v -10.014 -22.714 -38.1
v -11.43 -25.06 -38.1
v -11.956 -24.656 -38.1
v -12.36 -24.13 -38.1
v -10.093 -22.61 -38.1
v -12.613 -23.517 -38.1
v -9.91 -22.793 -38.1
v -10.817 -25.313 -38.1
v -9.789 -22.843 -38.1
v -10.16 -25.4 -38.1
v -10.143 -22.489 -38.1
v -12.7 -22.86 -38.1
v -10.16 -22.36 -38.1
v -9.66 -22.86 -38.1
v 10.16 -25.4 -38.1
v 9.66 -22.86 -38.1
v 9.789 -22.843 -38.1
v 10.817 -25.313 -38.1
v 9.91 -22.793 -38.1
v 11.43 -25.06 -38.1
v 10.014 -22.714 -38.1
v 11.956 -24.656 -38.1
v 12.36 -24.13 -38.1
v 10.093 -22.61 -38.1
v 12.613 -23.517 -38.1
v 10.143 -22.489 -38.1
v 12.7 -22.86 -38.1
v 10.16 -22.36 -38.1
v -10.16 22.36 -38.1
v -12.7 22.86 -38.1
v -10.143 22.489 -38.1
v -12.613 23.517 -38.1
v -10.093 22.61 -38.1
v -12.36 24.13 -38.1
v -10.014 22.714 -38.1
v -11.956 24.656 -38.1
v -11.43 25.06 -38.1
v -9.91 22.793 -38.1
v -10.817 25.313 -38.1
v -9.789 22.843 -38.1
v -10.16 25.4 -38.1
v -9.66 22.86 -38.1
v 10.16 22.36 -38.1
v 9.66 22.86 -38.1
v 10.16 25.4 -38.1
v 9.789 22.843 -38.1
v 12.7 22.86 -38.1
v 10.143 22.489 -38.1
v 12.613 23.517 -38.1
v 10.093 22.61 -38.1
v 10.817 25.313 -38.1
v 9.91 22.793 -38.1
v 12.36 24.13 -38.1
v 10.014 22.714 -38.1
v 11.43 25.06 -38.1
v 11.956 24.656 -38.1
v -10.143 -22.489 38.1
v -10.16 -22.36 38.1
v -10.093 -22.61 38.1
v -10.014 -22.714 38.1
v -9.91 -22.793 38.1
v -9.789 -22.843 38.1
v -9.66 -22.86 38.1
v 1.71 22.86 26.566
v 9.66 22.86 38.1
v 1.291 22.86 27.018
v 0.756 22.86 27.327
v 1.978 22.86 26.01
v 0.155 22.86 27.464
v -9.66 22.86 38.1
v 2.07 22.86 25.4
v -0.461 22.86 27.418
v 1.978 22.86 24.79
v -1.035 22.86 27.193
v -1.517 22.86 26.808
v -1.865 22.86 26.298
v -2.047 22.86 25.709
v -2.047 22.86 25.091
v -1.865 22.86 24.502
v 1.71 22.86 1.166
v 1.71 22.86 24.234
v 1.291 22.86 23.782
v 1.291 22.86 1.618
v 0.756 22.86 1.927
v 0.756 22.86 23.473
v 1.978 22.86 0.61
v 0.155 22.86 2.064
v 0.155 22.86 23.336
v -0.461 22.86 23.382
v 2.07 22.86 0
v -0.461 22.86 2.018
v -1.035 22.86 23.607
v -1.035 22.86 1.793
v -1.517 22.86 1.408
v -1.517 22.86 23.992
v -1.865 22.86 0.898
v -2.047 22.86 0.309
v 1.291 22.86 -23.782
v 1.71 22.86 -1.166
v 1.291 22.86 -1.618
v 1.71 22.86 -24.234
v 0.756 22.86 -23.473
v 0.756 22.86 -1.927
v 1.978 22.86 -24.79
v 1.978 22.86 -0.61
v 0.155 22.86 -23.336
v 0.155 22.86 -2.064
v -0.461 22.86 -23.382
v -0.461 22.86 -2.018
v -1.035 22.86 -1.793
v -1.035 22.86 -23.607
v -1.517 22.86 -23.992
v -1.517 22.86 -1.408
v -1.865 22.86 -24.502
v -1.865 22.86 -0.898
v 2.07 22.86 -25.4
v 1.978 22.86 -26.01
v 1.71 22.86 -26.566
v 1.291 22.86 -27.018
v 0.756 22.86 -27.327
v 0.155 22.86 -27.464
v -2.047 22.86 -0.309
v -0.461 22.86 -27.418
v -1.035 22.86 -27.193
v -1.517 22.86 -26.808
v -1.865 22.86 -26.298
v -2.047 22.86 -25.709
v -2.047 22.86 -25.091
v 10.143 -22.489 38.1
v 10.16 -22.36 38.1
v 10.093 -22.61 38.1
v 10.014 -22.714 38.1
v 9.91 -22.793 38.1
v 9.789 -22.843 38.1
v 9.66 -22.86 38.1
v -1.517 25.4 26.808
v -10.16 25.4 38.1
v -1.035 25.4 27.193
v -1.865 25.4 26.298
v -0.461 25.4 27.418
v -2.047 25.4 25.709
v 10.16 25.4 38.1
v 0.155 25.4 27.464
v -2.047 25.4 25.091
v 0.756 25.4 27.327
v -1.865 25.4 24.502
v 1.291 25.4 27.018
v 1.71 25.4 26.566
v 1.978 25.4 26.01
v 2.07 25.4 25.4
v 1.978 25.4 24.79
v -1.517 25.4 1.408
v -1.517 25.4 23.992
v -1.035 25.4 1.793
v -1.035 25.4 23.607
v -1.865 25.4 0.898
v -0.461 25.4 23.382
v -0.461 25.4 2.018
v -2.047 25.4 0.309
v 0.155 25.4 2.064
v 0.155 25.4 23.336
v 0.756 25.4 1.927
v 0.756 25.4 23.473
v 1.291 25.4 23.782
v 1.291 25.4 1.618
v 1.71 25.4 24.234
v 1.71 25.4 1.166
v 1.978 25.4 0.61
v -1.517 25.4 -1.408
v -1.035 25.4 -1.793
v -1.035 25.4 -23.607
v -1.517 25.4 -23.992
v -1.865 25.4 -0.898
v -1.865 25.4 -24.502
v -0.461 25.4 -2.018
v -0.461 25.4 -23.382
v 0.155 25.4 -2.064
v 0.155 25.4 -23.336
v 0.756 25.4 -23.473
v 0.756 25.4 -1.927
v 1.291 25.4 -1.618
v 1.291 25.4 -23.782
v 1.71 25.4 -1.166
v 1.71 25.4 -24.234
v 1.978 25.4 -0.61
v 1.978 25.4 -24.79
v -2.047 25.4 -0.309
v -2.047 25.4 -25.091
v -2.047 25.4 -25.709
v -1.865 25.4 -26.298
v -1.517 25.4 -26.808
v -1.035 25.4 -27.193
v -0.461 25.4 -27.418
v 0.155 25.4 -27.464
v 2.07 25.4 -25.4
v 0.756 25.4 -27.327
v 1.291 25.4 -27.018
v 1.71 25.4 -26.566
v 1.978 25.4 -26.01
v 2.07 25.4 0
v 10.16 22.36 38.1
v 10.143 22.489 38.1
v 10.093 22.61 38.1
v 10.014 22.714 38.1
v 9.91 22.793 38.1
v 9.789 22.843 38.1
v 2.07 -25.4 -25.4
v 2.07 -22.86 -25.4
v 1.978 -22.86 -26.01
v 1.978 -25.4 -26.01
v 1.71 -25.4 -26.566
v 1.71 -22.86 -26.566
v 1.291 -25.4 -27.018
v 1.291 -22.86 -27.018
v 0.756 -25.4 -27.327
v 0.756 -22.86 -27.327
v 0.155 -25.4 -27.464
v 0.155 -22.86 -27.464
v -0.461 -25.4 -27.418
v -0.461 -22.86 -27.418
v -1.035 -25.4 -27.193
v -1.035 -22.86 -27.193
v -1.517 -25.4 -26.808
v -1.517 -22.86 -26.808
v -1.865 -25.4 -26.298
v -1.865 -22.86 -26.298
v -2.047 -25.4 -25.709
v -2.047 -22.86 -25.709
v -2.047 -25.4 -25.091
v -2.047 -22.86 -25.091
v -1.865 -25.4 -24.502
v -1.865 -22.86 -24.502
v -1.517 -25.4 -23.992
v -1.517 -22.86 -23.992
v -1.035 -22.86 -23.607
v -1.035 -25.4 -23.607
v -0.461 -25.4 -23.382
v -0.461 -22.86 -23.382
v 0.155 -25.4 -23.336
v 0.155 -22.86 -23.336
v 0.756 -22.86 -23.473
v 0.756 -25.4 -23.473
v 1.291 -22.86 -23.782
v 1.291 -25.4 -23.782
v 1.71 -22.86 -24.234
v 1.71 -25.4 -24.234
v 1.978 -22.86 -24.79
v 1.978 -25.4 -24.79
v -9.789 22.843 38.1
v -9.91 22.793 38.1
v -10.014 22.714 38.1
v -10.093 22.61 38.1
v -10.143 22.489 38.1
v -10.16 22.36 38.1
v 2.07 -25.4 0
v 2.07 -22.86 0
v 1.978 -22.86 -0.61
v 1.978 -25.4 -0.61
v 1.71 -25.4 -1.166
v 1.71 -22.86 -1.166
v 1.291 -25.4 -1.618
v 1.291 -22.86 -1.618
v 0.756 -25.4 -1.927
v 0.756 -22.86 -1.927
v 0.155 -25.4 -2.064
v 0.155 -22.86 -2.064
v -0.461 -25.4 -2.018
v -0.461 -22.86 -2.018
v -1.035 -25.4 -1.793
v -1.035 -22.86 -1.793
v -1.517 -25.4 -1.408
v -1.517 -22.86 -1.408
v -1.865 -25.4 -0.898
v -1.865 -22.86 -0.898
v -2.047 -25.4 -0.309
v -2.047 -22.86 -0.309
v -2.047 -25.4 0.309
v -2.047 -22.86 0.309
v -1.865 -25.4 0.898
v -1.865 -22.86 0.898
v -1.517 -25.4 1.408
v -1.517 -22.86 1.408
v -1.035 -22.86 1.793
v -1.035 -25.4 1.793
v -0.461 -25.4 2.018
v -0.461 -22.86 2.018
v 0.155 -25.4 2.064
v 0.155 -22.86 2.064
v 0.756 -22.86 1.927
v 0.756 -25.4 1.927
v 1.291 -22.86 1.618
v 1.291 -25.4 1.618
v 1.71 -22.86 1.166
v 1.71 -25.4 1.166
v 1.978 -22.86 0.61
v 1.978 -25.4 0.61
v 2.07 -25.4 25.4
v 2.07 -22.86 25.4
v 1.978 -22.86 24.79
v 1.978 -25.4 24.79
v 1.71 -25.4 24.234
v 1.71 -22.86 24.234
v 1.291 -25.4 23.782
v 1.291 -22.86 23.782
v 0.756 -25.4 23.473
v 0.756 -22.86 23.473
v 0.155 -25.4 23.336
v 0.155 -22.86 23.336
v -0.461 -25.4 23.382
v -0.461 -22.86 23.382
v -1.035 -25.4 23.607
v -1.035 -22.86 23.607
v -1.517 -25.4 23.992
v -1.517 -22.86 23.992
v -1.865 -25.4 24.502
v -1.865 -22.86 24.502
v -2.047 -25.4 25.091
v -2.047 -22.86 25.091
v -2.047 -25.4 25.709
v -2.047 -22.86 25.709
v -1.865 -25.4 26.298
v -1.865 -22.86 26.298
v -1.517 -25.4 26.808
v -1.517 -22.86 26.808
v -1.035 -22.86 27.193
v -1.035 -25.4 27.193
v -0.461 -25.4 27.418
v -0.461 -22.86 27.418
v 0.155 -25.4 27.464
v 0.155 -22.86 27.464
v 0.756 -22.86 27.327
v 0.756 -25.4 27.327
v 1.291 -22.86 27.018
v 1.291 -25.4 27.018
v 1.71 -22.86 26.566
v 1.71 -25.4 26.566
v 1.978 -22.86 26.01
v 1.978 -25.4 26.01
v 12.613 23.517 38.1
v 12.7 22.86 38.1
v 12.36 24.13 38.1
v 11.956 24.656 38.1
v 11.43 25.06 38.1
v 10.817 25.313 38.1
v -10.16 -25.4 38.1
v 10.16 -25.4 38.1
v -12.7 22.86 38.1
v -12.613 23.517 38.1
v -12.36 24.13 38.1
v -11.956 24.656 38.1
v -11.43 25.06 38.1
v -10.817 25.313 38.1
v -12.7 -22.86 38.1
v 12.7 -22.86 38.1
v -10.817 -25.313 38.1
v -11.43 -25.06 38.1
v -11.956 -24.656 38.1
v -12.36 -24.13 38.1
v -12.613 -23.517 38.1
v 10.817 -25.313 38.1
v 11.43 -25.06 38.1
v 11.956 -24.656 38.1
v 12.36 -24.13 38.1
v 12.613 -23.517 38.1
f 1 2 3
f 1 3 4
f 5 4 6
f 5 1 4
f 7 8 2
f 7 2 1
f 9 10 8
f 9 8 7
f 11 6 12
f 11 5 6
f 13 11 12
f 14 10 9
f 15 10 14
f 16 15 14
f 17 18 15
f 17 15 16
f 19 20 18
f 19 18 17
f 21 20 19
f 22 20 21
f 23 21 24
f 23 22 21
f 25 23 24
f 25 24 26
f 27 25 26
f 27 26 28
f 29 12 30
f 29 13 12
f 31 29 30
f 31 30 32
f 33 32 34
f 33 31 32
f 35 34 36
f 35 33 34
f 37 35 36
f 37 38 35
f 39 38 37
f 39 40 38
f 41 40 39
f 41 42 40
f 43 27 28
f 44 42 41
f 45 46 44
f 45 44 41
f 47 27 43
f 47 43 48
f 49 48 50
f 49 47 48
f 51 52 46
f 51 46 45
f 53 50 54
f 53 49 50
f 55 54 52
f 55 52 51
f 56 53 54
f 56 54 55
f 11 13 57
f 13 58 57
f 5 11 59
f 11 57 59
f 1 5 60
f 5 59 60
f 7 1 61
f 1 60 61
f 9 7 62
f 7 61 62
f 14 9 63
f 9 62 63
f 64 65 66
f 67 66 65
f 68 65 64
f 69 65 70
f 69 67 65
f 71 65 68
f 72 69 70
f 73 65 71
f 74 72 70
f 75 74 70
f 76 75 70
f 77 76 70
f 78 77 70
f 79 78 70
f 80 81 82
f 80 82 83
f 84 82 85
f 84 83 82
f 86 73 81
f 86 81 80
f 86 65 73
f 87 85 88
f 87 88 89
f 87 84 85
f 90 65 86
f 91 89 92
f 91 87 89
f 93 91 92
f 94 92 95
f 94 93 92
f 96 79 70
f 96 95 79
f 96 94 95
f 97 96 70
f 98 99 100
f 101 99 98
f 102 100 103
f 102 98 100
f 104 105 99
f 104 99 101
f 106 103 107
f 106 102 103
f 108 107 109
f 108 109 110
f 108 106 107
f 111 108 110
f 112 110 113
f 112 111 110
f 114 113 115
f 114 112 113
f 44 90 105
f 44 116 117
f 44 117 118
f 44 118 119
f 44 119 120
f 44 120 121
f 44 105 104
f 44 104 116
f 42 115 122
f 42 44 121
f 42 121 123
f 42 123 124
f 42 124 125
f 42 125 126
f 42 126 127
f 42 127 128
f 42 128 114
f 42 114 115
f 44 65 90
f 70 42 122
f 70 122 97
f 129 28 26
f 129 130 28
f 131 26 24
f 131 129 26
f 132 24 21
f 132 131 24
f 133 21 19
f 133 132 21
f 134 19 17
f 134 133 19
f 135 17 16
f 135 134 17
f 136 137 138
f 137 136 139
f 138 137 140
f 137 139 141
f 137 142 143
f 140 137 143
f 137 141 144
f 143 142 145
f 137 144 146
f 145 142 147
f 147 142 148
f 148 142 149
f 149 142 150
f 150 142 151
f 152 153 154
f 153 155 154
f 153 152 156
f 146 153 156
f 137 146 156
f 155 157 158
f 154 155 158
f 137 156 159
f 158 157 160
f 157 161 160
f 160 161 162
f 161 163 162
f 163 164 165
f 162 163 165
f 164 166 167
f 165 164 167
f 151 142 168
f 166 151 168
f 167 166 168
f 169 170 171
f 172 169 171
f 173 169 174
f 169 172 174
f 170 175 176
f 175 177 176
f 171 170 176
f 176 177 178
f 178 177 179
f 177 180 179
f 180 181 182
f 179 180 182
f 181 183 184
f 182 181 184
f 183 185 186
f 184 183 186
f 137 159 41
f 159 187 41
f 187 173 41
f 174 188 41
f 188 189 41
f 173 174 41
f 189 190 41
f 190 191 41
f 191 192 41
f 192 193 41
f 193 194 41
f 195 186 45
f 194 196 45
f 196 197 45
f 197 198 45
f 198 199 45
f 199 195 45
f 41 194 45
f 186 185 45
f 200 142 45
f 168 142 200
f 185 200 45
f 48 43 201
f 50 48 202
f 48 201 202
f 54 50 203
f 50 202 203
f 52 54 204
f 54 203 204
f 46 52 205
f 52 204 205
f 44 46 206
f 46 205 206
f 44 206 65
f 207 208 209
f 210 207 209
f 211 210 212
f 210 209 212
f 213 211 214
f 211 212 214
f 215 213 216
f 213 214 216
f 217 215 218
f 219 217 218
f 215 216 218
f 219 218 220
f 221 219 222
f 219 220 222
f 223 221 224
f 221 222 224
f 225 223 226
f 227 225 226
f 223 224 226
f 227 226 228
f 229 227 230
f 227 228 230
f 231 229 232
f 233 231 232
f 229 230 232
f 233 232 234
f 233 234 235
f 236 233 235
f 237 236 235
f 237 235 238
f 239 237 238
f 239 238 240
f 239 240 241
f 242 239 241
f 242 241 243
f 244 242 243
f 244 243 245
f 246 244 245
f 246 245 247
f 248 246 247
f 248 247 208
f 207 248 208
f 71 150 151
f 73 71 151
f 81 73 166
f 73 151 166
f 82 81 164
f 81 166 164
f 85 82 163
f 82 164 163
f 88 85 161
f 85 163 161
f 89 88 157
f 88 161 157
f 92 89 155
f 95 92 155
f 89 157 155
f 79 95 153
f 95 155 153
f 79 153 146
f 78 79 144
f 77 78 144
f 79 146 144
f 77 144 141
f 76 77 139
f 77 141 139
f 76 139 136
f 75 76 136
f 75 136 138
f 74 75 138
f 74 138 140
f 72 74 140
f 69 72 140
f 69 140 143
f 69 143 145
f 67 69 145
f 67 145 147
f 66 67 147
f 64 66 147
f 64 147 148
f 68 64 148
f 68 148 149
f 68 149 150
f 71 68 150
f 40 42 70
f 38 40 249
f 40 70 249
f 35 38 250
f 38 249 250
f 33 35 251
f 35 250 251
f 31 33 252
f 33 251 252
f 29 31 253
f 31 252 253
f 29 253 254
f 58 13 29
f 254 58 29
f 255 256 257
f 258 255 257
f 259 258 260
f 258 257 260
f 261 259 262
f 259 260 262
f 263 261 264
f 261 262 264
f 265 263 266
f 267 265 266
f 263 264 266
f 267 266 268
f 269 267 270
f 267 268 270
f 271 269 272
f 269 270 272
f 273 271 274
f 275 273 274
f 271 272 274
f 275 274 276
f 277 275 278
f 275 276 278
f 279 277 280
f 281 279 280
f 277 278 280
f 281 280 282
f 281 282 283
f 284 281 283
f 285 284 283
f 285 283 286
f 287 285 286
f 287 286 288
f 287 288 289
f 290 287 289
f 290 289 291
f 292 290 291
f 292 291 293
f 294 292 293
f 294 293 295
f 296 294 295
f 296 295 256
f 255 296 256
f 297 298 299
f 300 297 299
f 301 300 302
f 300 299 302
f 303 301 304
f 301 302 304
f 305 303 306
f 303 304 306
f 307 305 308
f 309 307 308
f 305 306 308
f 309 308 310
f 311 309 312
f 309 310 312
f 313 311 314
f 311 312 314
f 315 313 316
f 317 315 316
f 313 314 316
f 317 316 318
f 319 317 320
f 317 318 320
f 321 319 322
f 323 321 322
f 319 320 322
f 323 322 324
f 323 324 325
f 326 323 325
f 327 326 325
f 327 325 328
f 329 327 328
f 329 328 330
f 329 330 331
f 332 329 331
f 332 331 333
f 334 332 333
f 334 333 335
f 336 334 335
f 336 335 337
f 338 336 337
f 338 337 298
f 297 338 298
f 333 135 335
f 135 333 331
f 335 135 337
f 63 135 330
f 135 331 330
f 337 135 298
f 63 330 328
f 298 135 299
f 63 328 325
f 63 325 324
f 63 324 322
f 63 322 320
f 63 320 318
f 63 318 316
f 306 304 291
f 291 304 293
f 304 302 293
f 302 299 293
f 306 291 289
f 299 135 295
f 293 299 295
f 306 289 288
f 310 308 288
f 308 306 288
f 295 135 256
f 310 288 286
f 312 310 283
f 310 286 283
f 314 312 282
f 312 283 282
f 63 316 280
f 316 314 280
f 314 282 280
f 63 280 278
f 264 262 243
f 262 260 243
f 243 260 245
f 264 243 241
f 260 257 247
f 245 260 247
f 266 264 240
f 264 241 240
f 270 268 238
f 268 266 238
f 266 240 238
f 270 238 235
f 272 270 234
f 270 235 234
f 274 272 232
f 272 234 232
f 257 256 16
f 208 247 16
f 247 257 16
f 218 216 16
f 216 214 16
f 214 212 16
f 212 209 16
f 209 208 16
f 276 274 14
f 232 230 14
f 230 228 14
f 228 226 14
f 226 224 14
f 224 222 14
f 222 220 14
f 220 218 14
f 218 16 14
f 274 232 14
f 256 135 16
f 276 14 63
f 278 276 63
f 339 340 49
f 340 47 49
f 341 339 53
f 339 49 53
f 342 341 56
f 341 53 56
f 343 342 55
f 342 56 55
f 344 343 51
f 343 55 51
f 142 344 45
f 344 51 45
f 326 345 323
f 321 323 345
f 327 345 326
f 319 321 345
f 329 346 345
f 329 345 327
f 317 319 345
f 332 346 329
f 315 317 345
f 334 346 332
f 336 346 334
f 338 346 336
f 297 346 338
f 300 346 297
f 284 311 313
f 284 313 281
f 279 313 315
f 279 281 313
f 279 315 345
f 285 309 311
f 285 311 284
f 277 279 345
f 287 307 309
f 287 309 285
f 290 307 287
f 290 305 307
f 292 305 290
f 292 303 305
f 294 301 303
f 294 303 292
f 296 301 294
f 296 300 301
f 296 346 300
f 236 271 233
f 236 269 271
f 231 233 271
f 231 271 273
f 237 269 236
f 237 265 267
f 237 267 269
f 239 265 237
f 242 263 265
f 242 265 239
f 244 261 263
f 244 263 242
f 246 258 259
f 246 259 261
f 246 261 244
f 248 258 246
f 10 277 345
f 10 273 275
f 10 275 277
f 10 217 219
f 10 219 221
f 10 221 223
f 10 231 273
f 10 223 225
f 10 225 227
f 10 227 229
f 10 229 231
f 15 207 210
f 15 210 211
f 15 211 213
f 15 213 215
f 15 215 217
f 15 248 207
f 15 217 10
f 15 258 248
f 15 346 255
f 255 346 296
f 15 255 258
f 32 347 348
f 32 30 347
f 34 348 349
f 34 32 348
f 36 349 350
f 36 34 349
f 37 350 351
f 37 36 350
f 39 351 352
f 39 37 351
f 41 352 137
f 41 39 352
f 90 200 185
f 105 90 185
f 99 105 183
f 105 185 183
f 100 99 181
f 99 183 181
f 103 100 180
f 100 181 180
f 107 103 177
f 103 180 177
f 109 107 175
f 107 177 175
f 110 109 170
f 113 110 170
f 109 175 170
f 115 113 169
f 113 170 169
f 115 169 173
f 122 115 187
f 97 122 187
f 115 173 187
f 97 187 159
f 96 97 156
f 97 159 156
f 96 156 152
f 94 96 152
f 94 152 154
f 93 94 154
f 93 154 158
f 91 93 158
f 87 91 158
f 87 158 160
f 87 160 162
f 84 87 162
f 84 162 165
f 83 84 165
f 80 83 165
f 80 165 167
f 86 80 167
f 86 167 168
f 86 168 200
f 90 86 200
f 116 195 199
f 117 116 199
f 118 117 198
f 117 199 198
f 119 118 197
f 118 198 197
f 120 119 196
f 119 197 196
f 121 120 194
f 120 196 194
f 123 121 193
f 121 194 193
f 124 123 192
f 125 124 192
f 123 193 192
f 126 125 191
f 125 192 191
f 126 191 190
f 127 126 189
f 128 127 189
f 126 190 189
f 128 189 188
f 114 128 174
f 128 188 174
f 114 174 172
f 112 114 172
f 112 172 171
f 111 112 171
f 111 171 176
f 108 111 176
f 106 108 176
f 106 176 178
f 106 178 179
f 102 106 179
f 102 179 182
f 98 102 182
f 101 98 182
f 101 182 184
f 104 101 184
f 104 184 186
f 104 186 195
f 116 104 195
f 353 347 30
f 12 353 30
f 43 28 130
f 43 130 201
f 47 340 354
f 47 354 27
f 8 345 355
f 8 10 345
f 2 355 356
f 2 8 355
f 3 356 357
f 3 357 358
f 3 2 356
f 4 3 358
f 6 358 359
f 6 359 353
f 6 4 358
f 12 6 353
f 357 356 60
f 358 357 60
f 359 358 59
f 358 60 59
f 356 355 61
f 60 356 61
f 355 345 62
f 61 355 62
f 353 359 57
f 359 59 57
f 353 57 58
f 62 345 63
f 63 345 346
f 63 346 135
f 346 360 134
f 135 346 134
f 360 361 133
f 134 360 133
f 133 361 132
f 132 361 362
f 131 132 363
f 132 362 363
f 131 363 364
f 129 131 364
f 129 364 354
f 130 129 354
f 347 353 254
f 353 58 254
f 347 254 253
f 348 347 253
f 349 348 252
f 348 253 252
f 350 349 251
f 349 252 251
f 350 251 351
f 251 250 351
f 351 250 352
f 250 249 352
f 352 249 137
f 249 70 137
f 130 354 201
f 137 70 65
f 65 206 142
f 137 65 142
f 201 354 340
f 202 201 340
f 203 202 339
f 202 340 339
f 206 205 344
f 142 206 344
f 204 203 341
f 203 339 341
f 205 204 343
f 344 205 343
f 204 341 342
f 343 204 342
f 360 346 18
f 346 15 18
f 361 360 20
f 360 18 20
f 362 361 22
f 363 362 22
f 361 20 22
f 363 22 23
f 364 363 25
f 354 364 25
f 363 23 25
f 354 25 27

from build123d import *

# Parameters (mm, degrees)
SKETCH1_W                 = 76.2
SKETCH1_H                 = 50.8
BOSS_EXTRUDE1_DEPTH       = 25.4
SKETCH2_W                 = 20.32
SKETCH2_H                 = 45.72
CUT_EXTRUDE1_DEPTH        = 77.2
F_6_CLEARANCE_HOLE1_D     = 4.1402
F_6_CLEARANCE_HOLE1_DEPTH = 50.8
F_6_CLEARANCE_HOLE2_D     = 4.1402
F_6_CLEARANCE_HOLE2_DEPTH = 50.8
FILLET1_R                 = 0.5
FILLET2_R                 = 2.54


with BuildPart() as part:
    # Sketch1 → Boss-Extrude1 (new body)
    with BuildSketch(Plane(origin=(12.7, 0, 0), x_dir=(0, 0, -1), z_dir=(1, 0, 0))):
        Rectangle(SKETCH1_W, SKETCH1_H)
    extrude(amount=-BOSS_EXTRUDE1_DEPTH)

    # Sketch2 → Cut-Extrude1 (cut, through all)
    with BuildSketch(Plane(origin=(0, 0, -38.1), x_dir=(-1, 0, 0), z_dir=(0, 0, -1))):
        Rectangle(SKETCH2_W, SKETCH2_H)
    extrude(amount=-CUT_EXTRUDE1_DEPTH, mode=Mode.SUBTRACT)

    # #6 Clearance Hole1
    with Locations(Plane(origin=(0, -25.4, 0), x_dir=(-1, 0, 0), z_dir=(0, -1, 0))):
        with Locations((0, 711.2), (0, 736.6), (0, 685.8), (0, 660.4), (0, 635), (0, 609.6), (0, 584.2), (0, 558.8), (0, 533.4), (0, 508), (0, 482.6), (0, 457.2), (0, 431.8), (0, 406.4), (0, 381), (0, 355.6), (0, 330.2), (0, 304.8), (0, 279.4), (0, 254), (0, 228.6), (0, 203.2), (0, 177.8), (0, 152.4), (0, 127), (0, 101.6), (0, 76.2), (0, 50.8), (0, 25.4), (0, 0), (0, -25.4), (0, -50.8), (0, -76.2), (0, -101.6), (0, -127), (0, -152.4), (0, -177.8), (0, -203.2), (0, -228.6), (0, -254), (0, -279.4), (0, -304.8), (0, -330.2), (0, -355.6), (0, -381), (0, -406.4), (0, -431.8), (0, -457.2), (0, -482.6), (0, -508), (0, -533.4), (0, -558.8), (0, -584.2), (0, -609.6), (0, -635), (0, -660.4), (0, -685.8), (0, -711.2), (0, -736.6)):
            Hole(F_6_CLEARANCE_HOLE1_D / 2, depth=F_6_CLEARANCE_HOLE1_DEPTH)

    # #6 Clearance Hole2
    with Locations(Plane(origin=(0, 25.4, 0), x_dir=(1, 0, 0), z_dir=(0, 1, 0))):
        with Locations((0, 711.2), (0, 736.6), (0, 685.8), (0, 660.4), (0, 635), (0, 609.6), (0, 584.2), (0, 558.8), (0, 533.4), (0, 508), (0, 482.6), (0, 457.2), (0, 431.8), (0, 406.4), (0, 381), (0, 355.6), (0, 330.2), (0, 304.8), (0, 279.4), (0, 254), (0, 228.6), (0, 203.2), (0, 177.8), (0, 152.4), (0, 127), (0, 101.6), (0, 76.2), (0, 50.8), (0, 25.4), (0, 0), (0, -25.4), (0, -50.8), (0, -76.2), (0, -101.6), (0, -127), (0, -152.4), (0, -177.8), (0, -203.2), (0, -228.6), (0, -254), (0, -279.4), (0, -304.8), (0, -330.2), (0, -355.6), (0, -381), (0, -406.4), (0, -431.8), (0, -457.2), (0, -482.6), (0, -508), (0, -533.4), (0, -558.8), (0, -584.2), (0, -609.6), (0, -635), (0, -660.4), (0, -685.8), (0, -711.2), (0, -736.6)):
            Hole(F_6_CLEARANCE_HOLE2_D / 2, depth=F_6_CLEARANCE_HOLE2_DEPTH)

    # Fillet1
    fillet1_edges = [part.edges().sort_by_distance(p)[0] for p in [
        (-10.16, -22.86, 0),
        (10.16, -22.86, 0),
        (10.16, 22.86, 0),
        (-10.16, 22.86, 0),
    ]]
    fillet(fillet1_edges, radius=FILLET1_R)

    # Fillet2
    fillet2_edges = [part.edges().sort_by_distance(p)[0] for p in [
        (-12.7, 25.4, 0),
        (-12.7, -25.4, 0),
        (12.7, 25.4, 0),
        (12.7, -25.4, 0),
    ]]
    fillet(fillet2_edges, radius=FILLET2_R)


solid = part.part
